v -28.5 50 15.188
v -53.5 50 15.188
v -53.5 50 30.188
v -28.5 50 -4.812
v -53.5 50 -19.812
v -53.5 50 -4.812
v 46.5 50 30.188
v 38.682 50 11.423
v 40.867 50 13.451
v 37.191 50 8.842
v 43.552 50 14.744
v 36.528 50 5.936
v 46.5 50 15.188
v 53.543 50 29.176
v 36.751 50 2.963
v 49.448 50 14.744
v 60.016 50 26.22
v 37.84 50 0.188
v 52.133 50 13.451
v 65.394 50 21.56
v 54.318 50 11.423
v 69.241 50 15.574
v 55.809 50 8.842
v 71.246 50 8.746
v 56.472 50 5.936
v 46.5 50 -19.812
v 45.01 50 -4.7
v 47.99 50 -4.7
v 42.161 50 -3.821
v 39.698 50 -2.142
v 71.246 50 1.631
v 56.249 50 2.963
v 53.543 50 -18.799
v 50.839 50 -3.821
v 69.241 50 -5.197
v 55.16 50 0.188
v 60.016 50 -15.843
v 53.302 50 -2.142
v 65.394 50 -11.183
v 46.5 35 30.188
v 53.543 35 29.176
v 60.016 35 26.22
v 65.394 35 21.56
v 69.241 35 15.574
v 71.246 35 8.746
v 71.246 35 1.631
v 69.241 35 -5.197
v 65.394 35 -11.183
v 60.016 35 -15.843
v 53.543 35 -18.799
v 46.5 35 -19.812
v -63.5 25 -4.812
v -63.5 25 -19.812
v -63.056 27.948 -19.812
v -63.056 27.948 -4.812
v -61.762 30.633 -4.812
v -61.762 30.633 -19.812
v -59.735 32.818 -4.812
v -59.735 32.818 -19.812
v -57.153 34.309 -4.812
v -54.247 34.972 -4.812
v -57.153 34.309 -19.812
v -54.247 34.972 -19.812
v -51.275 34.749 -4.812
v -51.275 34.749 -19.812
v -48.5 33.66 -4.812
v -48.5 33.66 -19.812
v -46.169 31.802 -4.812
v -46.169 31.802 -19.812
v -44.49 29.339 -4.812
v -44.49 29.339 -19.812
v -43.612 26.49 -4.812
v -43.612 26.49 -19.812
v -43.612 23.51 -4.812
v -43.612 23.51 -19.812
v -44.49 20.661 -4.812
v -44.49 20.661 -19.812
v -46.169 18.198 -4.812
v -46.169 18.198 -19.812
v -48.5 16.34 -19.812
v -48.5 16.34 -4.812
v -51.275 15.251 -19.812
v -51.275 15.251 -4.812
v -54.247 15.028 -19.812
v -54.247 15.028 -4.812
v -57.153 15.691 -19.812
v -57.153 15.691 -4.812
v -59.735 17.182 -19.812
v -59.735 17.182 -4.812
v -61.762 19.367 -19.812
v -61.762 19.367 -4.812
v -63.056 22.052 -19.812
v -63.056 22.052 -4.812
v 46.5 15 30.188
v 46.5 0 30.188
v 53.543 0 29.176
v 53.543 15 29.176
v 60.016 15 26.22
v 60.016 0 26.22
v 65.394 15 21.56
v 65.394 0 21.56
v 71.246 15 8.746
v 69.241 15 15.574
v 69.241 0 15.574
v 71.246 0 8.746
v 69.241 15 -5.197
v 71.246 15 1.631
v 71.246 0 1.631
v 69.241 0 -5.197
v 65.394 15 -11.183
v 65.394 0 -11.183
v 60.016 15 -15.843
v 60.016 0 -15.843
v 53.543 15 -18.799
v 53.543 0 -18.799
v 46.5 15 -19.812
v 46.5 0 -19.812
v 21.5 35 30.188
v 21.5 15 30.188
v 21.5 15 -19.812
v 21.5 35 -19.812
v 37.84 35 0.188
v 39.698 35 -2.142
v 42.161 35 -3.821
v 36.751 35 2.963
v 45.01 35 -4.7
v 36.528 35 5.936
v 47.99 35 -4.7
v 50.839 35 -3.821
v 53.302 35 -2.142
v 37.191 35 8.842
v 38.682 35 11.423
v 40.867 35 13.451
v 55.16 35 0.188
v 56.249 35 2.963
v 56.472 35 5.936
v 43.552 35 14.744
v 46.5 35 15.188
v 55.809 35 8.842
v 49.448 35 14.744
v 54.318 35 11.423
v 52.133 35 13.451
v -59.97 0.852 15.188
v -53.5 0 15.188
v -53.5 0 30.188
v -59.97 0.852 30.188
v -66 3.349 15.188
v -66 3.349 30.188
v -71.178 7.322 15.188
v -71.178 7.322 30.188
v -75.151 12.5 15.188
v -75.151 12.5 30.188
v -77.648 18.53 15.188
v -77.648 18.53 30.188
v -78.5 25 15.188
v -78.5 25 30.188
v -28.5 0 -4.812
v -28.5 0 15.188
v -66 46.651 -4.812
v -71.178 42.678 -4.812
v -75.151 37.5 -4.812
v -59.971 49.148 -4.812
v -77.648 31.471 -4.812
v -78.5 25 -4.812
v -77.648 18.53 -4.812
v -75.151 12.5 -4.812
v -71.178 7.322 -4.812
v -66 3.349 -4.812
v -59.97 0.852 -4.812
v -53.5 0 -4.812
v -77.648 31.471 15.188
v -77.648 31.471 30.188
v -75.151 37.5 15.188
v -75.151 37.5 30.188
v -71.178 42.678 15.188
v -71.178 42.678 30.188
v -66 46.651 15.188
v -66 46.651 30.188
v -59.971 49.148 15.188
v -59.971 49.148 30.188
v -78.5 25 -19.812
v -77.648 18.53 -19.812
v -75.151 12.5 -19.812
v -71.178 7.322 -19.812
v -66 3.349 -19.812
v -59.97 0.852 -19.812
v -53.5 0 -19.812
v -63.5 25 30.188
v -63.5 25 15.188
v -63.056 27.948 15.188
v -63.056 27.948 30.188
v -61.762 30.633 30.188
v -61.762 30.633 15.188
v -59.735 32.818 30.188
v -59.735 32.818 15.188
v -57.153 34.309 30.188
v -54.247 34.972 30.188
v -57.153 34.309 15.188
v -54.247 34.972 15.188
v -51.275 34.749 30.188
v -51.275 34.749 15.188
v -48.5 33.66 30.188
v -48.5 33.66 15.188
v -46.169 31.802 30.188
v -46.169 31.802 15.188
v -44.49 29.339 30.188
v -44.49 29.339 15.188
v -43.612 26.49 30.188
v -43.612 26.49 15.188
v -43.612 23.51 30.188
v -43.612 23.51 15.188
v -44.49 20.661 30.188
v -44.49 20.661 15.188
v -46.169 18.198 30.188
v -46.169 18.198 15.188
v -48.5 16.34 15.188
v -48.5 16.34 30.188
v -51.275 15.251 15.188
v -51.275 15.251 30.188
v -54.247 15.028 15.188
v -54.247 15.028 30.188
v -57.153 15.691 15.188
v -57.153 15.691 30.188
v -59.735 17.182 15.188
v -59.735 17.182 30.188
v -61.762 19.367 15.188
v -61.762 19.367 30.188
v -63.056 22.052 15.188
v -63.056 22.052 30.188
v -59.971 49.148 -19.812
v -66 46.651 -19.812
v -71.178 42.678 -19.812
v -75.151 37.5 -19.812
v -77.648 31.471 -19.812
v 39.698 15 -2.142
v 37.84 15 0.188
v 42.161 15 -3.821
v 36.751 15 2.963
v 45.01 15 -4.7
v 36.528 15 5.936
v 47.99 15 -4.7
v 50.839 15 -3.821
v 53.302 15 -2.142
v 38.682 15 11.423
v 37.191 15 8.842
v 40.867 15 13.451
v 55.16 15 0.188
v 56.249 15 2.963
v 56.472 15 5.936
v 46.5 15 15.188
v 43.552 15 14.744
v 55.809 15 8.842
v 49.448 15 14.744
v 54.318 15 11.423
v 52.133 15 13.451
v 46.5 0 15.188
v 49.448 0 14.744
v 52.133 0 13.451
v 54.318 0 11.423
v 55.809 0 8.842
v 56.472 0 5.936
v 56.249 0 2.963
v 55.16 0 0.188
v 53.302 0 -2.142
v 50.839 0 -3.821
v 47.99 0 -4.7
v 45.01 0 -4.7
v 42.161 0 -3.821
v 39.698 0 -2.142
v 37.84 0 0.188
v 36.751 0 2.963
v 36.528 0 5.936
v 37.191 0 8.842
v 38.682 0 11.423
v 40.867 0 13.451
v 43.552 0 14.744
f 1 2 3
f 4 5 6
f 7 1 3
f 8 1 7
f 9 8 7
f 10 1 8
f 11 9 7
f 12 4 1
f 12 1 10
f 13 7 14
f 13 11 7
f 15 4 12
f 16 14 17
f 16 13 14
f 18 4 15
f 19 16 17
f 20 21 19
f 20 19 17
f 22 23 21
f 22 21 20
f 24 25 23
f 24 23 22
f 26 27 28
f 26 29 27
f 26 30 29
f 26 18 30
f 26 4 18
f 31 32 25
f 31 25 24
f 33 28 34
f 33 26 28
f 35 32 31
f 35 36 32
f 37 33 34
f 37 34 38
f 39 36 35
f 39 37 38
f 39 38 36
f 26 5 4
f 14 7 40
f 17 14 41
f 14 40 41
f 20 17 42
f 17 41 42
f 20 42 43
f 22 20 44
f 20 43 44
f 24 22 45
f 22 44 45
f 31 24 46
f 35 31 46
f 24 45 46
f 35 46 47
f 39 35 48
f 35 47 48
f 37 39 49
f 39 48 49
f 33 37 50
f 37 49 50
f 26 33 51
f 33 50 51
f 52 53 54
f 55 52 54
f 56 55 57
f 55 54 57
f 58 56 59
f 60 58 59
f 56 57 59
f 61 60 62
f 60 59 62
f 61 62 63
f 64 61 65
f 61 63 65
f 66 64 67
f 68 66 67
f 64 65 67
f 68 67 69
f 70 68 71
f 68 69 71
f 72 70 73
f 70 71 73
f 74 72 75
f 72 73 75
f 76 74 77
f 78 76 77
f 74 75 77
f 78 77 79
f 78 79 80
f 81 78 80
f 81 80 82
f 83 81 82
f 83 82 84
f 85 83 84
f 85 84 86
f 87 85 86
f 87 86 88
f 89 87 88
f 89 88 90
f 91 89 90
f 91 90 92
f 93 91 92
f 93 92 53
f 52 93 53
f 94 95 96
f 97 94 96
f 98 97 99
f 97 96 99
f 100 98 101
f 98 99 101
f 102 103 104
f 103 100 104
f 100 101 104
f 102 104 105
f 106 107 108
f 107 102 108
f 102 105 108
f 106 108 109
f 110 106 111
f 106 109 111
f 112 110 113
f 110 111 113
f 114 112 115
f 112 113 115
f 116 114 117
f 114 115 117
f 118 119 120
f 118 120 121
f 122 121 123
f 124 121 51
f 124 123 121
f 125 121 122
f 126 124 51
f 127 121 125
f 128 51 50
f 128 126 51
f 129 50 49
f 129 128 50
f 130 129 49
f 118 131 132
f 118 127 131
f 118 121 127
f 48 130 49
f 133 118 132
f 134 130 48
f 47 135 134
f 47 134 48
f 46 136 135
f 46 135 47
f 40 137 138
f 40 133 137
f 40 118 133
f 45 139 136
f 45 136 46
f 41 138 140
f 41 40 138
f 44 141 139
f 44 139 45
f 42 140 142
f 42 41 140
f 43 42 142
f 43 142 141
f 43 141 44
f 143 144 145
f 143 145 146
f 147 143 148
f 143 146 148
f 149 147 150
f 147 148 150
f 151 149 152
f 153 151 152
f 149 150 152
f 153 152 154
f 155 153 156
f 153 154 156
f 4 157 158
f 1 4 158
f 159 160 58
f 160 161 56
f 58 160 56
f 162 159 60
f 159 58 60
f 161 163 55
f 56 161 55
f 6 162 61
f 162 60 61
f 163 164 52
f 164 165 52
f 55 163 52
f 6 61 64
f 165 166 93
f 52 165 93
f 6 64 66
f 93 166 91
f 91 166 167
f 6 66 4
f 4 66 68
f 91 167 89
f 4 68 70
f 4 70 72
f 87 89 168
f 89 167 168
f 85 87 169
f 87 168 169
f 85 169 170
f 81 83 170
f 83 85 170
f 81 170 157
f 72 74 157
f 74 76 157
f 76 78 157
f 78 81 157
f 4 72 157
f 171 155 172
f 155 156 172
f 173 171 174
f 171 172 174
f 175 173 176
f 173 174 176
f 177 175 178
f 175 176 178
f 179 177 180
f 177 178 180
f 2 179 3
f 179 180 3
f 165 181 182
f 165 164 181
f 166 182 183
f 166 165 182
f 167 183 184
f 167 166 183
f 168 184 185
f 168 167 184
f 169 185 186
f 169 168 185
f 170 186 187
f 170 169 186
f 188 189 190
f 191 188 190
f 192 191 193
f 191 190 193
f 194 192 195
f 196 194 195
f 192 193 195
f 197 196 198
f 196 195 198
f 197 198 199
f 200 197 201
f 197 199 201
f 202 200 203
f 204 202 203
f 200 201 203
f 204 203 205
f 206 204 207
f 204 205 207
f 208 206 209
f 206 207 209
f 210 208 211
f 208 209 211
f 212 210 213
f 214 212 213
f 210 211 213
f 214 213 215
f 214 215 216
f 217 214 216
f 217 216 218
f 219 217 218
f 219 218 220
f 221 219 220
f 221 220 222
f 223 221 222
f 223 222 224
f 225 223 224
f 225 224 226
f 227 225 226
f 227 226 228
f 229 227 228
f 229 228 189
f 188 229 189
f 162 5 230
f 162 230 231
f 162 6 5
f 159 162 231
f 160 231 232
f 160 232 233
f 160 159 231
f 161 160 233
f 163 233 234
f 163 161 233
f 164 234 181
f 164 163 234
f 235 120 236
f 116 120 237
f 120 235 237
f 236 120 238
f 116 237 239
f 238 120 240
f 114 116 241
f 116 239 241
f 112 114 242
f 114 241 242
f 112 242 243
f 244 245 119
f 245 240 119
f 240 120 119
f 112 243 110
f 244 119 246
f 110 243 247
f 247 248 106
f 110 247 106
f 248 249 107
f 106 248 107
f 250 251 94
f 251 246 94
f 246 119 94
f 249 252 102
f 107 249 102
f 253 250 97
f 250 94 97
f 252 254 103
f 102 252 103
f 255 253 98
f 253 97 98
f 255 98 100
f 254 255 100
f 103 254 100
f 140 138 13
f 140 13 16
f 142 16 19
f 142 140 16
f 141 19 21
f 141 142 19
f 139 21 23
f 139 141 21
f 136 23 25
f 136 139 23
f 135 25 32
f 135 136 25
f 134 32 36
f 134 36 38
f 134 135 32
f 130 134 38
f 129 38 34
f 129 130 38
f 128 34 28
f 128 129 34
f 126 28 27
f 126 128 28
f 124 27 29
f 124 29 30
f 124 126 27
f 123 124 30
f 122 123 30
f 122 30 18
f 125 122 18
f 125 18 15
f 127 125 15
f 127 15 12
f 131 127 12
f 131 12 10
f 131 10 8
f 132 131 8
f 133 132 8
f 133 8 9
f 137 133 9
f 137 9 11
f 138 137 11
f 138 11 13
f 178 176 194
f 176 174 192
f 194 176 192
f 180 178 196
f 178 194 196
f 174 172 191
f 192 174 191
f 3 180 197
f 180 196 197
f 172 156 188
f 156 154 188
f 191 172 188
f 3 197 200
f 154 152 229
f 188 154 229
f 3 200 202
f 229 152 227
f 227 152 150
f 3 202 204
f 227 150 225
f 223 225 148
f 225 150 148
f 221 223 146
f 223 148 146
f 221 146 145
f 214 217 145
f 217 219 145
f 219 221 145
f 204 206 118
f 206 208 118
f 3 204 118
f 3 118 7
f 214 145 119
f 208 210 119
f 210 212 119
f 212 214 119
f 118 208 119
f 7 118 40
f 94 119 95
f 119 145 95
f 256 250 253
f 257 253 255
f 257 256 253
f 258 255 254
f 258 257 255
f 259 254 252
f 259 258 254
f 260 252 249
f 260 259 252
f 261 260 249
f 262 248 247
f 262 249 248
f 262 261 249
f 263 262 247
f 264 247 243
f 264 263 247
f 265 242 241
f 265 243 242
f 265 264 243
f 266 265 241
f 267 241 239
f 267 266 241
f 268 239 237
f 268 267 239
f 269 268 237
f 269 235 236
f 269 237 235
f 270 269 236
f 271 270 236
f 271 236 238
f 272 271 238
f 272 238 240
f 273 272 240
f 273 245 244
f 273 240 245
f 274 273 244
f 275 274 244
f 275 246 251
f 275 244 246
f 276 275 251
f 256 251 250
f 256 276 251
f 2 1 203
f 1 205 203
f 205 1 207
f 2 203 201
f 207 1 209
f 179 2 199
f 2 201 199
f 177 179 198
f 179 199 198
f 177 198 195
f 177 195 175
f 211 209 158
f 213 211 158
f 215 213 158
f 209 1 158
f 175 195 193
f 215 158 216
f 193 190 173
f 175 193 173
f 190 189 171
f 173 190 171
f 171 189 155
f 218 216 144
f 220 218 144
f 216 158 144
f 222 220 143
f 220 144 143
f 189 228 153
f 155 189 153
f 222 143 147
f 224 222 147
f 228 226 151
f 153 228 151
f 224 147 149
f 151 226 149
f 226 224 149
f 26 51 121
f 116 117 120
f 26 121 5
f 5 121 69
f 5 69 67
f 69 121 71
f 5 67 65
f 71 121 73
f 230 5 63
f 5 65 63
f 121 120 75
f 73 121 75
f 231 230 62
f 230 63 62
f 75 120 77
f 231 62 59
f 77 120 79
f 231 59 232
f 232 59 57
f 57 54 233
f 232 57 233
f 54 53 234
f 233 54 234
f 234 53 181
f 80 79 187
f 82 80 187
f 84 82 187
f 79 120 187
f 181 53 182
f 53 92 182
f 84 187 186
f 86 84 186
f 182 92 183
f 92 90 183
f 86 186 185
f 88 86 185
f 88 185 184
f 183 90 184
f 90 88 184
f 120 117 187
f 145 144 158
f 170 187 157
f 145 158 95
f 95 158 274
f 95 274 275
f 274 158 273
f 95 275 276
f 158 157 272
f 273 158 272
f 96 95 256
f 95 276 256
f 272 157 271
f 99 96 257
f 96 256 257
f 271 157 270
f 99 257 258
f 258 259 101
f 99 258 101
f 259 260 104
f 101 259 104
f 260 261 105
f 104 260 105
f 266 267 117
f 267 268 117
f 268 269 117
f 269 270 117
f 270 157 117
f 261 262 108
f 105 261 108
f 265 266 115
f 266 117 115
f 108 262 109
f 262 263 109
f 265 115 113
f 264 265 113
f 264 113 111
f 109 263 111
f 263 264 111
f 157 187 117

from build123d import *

# Parameters (mm, degrees)
SKETCH1_R           = 10
BOSS_EXTRUDE1_DEPTH = 50
SKETCH2_W           = 50
SKETCH2_H           = 20
CUT_EXTRUDE1_DEPTH  = 106.651549918
FILLET1_R           = 25
FILLET2_R           = 25
FILLET3_R           = 25
FILLET4_R           = 25
SKETCH3_R           = 10
CUT_EXTRUDE2_DEPTH  = 106.651549918


with BuildPart() as part:
    # Sketch1 → Boss-Extrude1 (new body)
    with BuildSketch(Plane(origin=(0, 0, 0), x_dir=(1, 0, 0), z_dir=(0, 1, 0))):
        with BuildLine():
            Line((-78.5, -15.188404139), (-78.5, -30.188404139))
            Line((-78.5, -30.188404139), (46.5, -30.188404139))
            ThreePointArc((46.5, -30.188404139), (71.5, -5.188404139), (46.5, 19.811595861))
            Line((46.5, 19.811595861), (-78.5, 19.811595861))
            Line((-78.5, 19.811595861), (-78.5, 4.811595861))
            Line((-78.5, 4.811595861), (-28.5, 4.811595861))
            Line((-28.5, 4.811595861), (-28.5, -15.188404139))
            Line((-28.5, -15.188404139), (-78.5, -15.188404139))
        make_face()
        with Locations(Location((46.5, -5.188404139, 0), (0, 0, 270))):
            Circle(SKETCH1_R, mode=Mode.SUBTRACT)
    extrude(amount=BOSS_EXTRUDE1_DEPTH)

    # Sketch2 → Cut-Extrude1 (cut, through all)
    with BuildSketch(Plane.XY.offset(30.188404139)):
        with Locations((46.5, 25)):
            Rectangle(SKETCH2_W, SKETCH2_H)
    extrude(amount=-CUT_EXTRUDE1_DEPTH, mode=Mode.SUBTRACT)

    # Fillet1
    fillet1_edges = [part.edges().sort_by_distance(p)[0] for p in [
        (-78.5, 0, -12.311595861),
    ]]
    fillet(fillet1_edges, radius=FILLET1_R)

    # Fillet2
    fillet2_edges = [part.edges().sort_by_distance(p)[0] for p in [
        (-78.5, 0, 22.688404139),
    ]]
    fillet(fillet2_edges, radius=FILLET2_R)

    # Fillet3
    fillet3_edges = [part.edges().sort_by_distance(p)[0] for p in [
        (-78.5, 50, 22.688404139),
    ]]
    fillet(fillet3_edges, radius=FILLET3_R - 0.0001)  # a hair under: the kernel refuses the full size

    # Fillet4
    fillet4_edges = [part.edges().sort_by_distance(p)[0] for p in [
        (-78.5, 50, -12.311595861),
    ]]
    fillet(fillet4_edges, radius=FILLET4_R - 0.0001)  # a hair under: the kernel refuses the full size

    # Sketch3 → Cut-Extrude2 (cut, through all)
    with BuildSketch(Plane(origin=(0, 0, -19.811595861), x_dir=(-1, 0, 0), z_dir=(0, 0, -1))):
        with Locations((53.5, 25)):
            Circle(SKETCH3_R)
    extrude(amount=-CUT_EXTRUDE2_DEPTH, mode=Mode.SUBTRACT)


solid = part.part
